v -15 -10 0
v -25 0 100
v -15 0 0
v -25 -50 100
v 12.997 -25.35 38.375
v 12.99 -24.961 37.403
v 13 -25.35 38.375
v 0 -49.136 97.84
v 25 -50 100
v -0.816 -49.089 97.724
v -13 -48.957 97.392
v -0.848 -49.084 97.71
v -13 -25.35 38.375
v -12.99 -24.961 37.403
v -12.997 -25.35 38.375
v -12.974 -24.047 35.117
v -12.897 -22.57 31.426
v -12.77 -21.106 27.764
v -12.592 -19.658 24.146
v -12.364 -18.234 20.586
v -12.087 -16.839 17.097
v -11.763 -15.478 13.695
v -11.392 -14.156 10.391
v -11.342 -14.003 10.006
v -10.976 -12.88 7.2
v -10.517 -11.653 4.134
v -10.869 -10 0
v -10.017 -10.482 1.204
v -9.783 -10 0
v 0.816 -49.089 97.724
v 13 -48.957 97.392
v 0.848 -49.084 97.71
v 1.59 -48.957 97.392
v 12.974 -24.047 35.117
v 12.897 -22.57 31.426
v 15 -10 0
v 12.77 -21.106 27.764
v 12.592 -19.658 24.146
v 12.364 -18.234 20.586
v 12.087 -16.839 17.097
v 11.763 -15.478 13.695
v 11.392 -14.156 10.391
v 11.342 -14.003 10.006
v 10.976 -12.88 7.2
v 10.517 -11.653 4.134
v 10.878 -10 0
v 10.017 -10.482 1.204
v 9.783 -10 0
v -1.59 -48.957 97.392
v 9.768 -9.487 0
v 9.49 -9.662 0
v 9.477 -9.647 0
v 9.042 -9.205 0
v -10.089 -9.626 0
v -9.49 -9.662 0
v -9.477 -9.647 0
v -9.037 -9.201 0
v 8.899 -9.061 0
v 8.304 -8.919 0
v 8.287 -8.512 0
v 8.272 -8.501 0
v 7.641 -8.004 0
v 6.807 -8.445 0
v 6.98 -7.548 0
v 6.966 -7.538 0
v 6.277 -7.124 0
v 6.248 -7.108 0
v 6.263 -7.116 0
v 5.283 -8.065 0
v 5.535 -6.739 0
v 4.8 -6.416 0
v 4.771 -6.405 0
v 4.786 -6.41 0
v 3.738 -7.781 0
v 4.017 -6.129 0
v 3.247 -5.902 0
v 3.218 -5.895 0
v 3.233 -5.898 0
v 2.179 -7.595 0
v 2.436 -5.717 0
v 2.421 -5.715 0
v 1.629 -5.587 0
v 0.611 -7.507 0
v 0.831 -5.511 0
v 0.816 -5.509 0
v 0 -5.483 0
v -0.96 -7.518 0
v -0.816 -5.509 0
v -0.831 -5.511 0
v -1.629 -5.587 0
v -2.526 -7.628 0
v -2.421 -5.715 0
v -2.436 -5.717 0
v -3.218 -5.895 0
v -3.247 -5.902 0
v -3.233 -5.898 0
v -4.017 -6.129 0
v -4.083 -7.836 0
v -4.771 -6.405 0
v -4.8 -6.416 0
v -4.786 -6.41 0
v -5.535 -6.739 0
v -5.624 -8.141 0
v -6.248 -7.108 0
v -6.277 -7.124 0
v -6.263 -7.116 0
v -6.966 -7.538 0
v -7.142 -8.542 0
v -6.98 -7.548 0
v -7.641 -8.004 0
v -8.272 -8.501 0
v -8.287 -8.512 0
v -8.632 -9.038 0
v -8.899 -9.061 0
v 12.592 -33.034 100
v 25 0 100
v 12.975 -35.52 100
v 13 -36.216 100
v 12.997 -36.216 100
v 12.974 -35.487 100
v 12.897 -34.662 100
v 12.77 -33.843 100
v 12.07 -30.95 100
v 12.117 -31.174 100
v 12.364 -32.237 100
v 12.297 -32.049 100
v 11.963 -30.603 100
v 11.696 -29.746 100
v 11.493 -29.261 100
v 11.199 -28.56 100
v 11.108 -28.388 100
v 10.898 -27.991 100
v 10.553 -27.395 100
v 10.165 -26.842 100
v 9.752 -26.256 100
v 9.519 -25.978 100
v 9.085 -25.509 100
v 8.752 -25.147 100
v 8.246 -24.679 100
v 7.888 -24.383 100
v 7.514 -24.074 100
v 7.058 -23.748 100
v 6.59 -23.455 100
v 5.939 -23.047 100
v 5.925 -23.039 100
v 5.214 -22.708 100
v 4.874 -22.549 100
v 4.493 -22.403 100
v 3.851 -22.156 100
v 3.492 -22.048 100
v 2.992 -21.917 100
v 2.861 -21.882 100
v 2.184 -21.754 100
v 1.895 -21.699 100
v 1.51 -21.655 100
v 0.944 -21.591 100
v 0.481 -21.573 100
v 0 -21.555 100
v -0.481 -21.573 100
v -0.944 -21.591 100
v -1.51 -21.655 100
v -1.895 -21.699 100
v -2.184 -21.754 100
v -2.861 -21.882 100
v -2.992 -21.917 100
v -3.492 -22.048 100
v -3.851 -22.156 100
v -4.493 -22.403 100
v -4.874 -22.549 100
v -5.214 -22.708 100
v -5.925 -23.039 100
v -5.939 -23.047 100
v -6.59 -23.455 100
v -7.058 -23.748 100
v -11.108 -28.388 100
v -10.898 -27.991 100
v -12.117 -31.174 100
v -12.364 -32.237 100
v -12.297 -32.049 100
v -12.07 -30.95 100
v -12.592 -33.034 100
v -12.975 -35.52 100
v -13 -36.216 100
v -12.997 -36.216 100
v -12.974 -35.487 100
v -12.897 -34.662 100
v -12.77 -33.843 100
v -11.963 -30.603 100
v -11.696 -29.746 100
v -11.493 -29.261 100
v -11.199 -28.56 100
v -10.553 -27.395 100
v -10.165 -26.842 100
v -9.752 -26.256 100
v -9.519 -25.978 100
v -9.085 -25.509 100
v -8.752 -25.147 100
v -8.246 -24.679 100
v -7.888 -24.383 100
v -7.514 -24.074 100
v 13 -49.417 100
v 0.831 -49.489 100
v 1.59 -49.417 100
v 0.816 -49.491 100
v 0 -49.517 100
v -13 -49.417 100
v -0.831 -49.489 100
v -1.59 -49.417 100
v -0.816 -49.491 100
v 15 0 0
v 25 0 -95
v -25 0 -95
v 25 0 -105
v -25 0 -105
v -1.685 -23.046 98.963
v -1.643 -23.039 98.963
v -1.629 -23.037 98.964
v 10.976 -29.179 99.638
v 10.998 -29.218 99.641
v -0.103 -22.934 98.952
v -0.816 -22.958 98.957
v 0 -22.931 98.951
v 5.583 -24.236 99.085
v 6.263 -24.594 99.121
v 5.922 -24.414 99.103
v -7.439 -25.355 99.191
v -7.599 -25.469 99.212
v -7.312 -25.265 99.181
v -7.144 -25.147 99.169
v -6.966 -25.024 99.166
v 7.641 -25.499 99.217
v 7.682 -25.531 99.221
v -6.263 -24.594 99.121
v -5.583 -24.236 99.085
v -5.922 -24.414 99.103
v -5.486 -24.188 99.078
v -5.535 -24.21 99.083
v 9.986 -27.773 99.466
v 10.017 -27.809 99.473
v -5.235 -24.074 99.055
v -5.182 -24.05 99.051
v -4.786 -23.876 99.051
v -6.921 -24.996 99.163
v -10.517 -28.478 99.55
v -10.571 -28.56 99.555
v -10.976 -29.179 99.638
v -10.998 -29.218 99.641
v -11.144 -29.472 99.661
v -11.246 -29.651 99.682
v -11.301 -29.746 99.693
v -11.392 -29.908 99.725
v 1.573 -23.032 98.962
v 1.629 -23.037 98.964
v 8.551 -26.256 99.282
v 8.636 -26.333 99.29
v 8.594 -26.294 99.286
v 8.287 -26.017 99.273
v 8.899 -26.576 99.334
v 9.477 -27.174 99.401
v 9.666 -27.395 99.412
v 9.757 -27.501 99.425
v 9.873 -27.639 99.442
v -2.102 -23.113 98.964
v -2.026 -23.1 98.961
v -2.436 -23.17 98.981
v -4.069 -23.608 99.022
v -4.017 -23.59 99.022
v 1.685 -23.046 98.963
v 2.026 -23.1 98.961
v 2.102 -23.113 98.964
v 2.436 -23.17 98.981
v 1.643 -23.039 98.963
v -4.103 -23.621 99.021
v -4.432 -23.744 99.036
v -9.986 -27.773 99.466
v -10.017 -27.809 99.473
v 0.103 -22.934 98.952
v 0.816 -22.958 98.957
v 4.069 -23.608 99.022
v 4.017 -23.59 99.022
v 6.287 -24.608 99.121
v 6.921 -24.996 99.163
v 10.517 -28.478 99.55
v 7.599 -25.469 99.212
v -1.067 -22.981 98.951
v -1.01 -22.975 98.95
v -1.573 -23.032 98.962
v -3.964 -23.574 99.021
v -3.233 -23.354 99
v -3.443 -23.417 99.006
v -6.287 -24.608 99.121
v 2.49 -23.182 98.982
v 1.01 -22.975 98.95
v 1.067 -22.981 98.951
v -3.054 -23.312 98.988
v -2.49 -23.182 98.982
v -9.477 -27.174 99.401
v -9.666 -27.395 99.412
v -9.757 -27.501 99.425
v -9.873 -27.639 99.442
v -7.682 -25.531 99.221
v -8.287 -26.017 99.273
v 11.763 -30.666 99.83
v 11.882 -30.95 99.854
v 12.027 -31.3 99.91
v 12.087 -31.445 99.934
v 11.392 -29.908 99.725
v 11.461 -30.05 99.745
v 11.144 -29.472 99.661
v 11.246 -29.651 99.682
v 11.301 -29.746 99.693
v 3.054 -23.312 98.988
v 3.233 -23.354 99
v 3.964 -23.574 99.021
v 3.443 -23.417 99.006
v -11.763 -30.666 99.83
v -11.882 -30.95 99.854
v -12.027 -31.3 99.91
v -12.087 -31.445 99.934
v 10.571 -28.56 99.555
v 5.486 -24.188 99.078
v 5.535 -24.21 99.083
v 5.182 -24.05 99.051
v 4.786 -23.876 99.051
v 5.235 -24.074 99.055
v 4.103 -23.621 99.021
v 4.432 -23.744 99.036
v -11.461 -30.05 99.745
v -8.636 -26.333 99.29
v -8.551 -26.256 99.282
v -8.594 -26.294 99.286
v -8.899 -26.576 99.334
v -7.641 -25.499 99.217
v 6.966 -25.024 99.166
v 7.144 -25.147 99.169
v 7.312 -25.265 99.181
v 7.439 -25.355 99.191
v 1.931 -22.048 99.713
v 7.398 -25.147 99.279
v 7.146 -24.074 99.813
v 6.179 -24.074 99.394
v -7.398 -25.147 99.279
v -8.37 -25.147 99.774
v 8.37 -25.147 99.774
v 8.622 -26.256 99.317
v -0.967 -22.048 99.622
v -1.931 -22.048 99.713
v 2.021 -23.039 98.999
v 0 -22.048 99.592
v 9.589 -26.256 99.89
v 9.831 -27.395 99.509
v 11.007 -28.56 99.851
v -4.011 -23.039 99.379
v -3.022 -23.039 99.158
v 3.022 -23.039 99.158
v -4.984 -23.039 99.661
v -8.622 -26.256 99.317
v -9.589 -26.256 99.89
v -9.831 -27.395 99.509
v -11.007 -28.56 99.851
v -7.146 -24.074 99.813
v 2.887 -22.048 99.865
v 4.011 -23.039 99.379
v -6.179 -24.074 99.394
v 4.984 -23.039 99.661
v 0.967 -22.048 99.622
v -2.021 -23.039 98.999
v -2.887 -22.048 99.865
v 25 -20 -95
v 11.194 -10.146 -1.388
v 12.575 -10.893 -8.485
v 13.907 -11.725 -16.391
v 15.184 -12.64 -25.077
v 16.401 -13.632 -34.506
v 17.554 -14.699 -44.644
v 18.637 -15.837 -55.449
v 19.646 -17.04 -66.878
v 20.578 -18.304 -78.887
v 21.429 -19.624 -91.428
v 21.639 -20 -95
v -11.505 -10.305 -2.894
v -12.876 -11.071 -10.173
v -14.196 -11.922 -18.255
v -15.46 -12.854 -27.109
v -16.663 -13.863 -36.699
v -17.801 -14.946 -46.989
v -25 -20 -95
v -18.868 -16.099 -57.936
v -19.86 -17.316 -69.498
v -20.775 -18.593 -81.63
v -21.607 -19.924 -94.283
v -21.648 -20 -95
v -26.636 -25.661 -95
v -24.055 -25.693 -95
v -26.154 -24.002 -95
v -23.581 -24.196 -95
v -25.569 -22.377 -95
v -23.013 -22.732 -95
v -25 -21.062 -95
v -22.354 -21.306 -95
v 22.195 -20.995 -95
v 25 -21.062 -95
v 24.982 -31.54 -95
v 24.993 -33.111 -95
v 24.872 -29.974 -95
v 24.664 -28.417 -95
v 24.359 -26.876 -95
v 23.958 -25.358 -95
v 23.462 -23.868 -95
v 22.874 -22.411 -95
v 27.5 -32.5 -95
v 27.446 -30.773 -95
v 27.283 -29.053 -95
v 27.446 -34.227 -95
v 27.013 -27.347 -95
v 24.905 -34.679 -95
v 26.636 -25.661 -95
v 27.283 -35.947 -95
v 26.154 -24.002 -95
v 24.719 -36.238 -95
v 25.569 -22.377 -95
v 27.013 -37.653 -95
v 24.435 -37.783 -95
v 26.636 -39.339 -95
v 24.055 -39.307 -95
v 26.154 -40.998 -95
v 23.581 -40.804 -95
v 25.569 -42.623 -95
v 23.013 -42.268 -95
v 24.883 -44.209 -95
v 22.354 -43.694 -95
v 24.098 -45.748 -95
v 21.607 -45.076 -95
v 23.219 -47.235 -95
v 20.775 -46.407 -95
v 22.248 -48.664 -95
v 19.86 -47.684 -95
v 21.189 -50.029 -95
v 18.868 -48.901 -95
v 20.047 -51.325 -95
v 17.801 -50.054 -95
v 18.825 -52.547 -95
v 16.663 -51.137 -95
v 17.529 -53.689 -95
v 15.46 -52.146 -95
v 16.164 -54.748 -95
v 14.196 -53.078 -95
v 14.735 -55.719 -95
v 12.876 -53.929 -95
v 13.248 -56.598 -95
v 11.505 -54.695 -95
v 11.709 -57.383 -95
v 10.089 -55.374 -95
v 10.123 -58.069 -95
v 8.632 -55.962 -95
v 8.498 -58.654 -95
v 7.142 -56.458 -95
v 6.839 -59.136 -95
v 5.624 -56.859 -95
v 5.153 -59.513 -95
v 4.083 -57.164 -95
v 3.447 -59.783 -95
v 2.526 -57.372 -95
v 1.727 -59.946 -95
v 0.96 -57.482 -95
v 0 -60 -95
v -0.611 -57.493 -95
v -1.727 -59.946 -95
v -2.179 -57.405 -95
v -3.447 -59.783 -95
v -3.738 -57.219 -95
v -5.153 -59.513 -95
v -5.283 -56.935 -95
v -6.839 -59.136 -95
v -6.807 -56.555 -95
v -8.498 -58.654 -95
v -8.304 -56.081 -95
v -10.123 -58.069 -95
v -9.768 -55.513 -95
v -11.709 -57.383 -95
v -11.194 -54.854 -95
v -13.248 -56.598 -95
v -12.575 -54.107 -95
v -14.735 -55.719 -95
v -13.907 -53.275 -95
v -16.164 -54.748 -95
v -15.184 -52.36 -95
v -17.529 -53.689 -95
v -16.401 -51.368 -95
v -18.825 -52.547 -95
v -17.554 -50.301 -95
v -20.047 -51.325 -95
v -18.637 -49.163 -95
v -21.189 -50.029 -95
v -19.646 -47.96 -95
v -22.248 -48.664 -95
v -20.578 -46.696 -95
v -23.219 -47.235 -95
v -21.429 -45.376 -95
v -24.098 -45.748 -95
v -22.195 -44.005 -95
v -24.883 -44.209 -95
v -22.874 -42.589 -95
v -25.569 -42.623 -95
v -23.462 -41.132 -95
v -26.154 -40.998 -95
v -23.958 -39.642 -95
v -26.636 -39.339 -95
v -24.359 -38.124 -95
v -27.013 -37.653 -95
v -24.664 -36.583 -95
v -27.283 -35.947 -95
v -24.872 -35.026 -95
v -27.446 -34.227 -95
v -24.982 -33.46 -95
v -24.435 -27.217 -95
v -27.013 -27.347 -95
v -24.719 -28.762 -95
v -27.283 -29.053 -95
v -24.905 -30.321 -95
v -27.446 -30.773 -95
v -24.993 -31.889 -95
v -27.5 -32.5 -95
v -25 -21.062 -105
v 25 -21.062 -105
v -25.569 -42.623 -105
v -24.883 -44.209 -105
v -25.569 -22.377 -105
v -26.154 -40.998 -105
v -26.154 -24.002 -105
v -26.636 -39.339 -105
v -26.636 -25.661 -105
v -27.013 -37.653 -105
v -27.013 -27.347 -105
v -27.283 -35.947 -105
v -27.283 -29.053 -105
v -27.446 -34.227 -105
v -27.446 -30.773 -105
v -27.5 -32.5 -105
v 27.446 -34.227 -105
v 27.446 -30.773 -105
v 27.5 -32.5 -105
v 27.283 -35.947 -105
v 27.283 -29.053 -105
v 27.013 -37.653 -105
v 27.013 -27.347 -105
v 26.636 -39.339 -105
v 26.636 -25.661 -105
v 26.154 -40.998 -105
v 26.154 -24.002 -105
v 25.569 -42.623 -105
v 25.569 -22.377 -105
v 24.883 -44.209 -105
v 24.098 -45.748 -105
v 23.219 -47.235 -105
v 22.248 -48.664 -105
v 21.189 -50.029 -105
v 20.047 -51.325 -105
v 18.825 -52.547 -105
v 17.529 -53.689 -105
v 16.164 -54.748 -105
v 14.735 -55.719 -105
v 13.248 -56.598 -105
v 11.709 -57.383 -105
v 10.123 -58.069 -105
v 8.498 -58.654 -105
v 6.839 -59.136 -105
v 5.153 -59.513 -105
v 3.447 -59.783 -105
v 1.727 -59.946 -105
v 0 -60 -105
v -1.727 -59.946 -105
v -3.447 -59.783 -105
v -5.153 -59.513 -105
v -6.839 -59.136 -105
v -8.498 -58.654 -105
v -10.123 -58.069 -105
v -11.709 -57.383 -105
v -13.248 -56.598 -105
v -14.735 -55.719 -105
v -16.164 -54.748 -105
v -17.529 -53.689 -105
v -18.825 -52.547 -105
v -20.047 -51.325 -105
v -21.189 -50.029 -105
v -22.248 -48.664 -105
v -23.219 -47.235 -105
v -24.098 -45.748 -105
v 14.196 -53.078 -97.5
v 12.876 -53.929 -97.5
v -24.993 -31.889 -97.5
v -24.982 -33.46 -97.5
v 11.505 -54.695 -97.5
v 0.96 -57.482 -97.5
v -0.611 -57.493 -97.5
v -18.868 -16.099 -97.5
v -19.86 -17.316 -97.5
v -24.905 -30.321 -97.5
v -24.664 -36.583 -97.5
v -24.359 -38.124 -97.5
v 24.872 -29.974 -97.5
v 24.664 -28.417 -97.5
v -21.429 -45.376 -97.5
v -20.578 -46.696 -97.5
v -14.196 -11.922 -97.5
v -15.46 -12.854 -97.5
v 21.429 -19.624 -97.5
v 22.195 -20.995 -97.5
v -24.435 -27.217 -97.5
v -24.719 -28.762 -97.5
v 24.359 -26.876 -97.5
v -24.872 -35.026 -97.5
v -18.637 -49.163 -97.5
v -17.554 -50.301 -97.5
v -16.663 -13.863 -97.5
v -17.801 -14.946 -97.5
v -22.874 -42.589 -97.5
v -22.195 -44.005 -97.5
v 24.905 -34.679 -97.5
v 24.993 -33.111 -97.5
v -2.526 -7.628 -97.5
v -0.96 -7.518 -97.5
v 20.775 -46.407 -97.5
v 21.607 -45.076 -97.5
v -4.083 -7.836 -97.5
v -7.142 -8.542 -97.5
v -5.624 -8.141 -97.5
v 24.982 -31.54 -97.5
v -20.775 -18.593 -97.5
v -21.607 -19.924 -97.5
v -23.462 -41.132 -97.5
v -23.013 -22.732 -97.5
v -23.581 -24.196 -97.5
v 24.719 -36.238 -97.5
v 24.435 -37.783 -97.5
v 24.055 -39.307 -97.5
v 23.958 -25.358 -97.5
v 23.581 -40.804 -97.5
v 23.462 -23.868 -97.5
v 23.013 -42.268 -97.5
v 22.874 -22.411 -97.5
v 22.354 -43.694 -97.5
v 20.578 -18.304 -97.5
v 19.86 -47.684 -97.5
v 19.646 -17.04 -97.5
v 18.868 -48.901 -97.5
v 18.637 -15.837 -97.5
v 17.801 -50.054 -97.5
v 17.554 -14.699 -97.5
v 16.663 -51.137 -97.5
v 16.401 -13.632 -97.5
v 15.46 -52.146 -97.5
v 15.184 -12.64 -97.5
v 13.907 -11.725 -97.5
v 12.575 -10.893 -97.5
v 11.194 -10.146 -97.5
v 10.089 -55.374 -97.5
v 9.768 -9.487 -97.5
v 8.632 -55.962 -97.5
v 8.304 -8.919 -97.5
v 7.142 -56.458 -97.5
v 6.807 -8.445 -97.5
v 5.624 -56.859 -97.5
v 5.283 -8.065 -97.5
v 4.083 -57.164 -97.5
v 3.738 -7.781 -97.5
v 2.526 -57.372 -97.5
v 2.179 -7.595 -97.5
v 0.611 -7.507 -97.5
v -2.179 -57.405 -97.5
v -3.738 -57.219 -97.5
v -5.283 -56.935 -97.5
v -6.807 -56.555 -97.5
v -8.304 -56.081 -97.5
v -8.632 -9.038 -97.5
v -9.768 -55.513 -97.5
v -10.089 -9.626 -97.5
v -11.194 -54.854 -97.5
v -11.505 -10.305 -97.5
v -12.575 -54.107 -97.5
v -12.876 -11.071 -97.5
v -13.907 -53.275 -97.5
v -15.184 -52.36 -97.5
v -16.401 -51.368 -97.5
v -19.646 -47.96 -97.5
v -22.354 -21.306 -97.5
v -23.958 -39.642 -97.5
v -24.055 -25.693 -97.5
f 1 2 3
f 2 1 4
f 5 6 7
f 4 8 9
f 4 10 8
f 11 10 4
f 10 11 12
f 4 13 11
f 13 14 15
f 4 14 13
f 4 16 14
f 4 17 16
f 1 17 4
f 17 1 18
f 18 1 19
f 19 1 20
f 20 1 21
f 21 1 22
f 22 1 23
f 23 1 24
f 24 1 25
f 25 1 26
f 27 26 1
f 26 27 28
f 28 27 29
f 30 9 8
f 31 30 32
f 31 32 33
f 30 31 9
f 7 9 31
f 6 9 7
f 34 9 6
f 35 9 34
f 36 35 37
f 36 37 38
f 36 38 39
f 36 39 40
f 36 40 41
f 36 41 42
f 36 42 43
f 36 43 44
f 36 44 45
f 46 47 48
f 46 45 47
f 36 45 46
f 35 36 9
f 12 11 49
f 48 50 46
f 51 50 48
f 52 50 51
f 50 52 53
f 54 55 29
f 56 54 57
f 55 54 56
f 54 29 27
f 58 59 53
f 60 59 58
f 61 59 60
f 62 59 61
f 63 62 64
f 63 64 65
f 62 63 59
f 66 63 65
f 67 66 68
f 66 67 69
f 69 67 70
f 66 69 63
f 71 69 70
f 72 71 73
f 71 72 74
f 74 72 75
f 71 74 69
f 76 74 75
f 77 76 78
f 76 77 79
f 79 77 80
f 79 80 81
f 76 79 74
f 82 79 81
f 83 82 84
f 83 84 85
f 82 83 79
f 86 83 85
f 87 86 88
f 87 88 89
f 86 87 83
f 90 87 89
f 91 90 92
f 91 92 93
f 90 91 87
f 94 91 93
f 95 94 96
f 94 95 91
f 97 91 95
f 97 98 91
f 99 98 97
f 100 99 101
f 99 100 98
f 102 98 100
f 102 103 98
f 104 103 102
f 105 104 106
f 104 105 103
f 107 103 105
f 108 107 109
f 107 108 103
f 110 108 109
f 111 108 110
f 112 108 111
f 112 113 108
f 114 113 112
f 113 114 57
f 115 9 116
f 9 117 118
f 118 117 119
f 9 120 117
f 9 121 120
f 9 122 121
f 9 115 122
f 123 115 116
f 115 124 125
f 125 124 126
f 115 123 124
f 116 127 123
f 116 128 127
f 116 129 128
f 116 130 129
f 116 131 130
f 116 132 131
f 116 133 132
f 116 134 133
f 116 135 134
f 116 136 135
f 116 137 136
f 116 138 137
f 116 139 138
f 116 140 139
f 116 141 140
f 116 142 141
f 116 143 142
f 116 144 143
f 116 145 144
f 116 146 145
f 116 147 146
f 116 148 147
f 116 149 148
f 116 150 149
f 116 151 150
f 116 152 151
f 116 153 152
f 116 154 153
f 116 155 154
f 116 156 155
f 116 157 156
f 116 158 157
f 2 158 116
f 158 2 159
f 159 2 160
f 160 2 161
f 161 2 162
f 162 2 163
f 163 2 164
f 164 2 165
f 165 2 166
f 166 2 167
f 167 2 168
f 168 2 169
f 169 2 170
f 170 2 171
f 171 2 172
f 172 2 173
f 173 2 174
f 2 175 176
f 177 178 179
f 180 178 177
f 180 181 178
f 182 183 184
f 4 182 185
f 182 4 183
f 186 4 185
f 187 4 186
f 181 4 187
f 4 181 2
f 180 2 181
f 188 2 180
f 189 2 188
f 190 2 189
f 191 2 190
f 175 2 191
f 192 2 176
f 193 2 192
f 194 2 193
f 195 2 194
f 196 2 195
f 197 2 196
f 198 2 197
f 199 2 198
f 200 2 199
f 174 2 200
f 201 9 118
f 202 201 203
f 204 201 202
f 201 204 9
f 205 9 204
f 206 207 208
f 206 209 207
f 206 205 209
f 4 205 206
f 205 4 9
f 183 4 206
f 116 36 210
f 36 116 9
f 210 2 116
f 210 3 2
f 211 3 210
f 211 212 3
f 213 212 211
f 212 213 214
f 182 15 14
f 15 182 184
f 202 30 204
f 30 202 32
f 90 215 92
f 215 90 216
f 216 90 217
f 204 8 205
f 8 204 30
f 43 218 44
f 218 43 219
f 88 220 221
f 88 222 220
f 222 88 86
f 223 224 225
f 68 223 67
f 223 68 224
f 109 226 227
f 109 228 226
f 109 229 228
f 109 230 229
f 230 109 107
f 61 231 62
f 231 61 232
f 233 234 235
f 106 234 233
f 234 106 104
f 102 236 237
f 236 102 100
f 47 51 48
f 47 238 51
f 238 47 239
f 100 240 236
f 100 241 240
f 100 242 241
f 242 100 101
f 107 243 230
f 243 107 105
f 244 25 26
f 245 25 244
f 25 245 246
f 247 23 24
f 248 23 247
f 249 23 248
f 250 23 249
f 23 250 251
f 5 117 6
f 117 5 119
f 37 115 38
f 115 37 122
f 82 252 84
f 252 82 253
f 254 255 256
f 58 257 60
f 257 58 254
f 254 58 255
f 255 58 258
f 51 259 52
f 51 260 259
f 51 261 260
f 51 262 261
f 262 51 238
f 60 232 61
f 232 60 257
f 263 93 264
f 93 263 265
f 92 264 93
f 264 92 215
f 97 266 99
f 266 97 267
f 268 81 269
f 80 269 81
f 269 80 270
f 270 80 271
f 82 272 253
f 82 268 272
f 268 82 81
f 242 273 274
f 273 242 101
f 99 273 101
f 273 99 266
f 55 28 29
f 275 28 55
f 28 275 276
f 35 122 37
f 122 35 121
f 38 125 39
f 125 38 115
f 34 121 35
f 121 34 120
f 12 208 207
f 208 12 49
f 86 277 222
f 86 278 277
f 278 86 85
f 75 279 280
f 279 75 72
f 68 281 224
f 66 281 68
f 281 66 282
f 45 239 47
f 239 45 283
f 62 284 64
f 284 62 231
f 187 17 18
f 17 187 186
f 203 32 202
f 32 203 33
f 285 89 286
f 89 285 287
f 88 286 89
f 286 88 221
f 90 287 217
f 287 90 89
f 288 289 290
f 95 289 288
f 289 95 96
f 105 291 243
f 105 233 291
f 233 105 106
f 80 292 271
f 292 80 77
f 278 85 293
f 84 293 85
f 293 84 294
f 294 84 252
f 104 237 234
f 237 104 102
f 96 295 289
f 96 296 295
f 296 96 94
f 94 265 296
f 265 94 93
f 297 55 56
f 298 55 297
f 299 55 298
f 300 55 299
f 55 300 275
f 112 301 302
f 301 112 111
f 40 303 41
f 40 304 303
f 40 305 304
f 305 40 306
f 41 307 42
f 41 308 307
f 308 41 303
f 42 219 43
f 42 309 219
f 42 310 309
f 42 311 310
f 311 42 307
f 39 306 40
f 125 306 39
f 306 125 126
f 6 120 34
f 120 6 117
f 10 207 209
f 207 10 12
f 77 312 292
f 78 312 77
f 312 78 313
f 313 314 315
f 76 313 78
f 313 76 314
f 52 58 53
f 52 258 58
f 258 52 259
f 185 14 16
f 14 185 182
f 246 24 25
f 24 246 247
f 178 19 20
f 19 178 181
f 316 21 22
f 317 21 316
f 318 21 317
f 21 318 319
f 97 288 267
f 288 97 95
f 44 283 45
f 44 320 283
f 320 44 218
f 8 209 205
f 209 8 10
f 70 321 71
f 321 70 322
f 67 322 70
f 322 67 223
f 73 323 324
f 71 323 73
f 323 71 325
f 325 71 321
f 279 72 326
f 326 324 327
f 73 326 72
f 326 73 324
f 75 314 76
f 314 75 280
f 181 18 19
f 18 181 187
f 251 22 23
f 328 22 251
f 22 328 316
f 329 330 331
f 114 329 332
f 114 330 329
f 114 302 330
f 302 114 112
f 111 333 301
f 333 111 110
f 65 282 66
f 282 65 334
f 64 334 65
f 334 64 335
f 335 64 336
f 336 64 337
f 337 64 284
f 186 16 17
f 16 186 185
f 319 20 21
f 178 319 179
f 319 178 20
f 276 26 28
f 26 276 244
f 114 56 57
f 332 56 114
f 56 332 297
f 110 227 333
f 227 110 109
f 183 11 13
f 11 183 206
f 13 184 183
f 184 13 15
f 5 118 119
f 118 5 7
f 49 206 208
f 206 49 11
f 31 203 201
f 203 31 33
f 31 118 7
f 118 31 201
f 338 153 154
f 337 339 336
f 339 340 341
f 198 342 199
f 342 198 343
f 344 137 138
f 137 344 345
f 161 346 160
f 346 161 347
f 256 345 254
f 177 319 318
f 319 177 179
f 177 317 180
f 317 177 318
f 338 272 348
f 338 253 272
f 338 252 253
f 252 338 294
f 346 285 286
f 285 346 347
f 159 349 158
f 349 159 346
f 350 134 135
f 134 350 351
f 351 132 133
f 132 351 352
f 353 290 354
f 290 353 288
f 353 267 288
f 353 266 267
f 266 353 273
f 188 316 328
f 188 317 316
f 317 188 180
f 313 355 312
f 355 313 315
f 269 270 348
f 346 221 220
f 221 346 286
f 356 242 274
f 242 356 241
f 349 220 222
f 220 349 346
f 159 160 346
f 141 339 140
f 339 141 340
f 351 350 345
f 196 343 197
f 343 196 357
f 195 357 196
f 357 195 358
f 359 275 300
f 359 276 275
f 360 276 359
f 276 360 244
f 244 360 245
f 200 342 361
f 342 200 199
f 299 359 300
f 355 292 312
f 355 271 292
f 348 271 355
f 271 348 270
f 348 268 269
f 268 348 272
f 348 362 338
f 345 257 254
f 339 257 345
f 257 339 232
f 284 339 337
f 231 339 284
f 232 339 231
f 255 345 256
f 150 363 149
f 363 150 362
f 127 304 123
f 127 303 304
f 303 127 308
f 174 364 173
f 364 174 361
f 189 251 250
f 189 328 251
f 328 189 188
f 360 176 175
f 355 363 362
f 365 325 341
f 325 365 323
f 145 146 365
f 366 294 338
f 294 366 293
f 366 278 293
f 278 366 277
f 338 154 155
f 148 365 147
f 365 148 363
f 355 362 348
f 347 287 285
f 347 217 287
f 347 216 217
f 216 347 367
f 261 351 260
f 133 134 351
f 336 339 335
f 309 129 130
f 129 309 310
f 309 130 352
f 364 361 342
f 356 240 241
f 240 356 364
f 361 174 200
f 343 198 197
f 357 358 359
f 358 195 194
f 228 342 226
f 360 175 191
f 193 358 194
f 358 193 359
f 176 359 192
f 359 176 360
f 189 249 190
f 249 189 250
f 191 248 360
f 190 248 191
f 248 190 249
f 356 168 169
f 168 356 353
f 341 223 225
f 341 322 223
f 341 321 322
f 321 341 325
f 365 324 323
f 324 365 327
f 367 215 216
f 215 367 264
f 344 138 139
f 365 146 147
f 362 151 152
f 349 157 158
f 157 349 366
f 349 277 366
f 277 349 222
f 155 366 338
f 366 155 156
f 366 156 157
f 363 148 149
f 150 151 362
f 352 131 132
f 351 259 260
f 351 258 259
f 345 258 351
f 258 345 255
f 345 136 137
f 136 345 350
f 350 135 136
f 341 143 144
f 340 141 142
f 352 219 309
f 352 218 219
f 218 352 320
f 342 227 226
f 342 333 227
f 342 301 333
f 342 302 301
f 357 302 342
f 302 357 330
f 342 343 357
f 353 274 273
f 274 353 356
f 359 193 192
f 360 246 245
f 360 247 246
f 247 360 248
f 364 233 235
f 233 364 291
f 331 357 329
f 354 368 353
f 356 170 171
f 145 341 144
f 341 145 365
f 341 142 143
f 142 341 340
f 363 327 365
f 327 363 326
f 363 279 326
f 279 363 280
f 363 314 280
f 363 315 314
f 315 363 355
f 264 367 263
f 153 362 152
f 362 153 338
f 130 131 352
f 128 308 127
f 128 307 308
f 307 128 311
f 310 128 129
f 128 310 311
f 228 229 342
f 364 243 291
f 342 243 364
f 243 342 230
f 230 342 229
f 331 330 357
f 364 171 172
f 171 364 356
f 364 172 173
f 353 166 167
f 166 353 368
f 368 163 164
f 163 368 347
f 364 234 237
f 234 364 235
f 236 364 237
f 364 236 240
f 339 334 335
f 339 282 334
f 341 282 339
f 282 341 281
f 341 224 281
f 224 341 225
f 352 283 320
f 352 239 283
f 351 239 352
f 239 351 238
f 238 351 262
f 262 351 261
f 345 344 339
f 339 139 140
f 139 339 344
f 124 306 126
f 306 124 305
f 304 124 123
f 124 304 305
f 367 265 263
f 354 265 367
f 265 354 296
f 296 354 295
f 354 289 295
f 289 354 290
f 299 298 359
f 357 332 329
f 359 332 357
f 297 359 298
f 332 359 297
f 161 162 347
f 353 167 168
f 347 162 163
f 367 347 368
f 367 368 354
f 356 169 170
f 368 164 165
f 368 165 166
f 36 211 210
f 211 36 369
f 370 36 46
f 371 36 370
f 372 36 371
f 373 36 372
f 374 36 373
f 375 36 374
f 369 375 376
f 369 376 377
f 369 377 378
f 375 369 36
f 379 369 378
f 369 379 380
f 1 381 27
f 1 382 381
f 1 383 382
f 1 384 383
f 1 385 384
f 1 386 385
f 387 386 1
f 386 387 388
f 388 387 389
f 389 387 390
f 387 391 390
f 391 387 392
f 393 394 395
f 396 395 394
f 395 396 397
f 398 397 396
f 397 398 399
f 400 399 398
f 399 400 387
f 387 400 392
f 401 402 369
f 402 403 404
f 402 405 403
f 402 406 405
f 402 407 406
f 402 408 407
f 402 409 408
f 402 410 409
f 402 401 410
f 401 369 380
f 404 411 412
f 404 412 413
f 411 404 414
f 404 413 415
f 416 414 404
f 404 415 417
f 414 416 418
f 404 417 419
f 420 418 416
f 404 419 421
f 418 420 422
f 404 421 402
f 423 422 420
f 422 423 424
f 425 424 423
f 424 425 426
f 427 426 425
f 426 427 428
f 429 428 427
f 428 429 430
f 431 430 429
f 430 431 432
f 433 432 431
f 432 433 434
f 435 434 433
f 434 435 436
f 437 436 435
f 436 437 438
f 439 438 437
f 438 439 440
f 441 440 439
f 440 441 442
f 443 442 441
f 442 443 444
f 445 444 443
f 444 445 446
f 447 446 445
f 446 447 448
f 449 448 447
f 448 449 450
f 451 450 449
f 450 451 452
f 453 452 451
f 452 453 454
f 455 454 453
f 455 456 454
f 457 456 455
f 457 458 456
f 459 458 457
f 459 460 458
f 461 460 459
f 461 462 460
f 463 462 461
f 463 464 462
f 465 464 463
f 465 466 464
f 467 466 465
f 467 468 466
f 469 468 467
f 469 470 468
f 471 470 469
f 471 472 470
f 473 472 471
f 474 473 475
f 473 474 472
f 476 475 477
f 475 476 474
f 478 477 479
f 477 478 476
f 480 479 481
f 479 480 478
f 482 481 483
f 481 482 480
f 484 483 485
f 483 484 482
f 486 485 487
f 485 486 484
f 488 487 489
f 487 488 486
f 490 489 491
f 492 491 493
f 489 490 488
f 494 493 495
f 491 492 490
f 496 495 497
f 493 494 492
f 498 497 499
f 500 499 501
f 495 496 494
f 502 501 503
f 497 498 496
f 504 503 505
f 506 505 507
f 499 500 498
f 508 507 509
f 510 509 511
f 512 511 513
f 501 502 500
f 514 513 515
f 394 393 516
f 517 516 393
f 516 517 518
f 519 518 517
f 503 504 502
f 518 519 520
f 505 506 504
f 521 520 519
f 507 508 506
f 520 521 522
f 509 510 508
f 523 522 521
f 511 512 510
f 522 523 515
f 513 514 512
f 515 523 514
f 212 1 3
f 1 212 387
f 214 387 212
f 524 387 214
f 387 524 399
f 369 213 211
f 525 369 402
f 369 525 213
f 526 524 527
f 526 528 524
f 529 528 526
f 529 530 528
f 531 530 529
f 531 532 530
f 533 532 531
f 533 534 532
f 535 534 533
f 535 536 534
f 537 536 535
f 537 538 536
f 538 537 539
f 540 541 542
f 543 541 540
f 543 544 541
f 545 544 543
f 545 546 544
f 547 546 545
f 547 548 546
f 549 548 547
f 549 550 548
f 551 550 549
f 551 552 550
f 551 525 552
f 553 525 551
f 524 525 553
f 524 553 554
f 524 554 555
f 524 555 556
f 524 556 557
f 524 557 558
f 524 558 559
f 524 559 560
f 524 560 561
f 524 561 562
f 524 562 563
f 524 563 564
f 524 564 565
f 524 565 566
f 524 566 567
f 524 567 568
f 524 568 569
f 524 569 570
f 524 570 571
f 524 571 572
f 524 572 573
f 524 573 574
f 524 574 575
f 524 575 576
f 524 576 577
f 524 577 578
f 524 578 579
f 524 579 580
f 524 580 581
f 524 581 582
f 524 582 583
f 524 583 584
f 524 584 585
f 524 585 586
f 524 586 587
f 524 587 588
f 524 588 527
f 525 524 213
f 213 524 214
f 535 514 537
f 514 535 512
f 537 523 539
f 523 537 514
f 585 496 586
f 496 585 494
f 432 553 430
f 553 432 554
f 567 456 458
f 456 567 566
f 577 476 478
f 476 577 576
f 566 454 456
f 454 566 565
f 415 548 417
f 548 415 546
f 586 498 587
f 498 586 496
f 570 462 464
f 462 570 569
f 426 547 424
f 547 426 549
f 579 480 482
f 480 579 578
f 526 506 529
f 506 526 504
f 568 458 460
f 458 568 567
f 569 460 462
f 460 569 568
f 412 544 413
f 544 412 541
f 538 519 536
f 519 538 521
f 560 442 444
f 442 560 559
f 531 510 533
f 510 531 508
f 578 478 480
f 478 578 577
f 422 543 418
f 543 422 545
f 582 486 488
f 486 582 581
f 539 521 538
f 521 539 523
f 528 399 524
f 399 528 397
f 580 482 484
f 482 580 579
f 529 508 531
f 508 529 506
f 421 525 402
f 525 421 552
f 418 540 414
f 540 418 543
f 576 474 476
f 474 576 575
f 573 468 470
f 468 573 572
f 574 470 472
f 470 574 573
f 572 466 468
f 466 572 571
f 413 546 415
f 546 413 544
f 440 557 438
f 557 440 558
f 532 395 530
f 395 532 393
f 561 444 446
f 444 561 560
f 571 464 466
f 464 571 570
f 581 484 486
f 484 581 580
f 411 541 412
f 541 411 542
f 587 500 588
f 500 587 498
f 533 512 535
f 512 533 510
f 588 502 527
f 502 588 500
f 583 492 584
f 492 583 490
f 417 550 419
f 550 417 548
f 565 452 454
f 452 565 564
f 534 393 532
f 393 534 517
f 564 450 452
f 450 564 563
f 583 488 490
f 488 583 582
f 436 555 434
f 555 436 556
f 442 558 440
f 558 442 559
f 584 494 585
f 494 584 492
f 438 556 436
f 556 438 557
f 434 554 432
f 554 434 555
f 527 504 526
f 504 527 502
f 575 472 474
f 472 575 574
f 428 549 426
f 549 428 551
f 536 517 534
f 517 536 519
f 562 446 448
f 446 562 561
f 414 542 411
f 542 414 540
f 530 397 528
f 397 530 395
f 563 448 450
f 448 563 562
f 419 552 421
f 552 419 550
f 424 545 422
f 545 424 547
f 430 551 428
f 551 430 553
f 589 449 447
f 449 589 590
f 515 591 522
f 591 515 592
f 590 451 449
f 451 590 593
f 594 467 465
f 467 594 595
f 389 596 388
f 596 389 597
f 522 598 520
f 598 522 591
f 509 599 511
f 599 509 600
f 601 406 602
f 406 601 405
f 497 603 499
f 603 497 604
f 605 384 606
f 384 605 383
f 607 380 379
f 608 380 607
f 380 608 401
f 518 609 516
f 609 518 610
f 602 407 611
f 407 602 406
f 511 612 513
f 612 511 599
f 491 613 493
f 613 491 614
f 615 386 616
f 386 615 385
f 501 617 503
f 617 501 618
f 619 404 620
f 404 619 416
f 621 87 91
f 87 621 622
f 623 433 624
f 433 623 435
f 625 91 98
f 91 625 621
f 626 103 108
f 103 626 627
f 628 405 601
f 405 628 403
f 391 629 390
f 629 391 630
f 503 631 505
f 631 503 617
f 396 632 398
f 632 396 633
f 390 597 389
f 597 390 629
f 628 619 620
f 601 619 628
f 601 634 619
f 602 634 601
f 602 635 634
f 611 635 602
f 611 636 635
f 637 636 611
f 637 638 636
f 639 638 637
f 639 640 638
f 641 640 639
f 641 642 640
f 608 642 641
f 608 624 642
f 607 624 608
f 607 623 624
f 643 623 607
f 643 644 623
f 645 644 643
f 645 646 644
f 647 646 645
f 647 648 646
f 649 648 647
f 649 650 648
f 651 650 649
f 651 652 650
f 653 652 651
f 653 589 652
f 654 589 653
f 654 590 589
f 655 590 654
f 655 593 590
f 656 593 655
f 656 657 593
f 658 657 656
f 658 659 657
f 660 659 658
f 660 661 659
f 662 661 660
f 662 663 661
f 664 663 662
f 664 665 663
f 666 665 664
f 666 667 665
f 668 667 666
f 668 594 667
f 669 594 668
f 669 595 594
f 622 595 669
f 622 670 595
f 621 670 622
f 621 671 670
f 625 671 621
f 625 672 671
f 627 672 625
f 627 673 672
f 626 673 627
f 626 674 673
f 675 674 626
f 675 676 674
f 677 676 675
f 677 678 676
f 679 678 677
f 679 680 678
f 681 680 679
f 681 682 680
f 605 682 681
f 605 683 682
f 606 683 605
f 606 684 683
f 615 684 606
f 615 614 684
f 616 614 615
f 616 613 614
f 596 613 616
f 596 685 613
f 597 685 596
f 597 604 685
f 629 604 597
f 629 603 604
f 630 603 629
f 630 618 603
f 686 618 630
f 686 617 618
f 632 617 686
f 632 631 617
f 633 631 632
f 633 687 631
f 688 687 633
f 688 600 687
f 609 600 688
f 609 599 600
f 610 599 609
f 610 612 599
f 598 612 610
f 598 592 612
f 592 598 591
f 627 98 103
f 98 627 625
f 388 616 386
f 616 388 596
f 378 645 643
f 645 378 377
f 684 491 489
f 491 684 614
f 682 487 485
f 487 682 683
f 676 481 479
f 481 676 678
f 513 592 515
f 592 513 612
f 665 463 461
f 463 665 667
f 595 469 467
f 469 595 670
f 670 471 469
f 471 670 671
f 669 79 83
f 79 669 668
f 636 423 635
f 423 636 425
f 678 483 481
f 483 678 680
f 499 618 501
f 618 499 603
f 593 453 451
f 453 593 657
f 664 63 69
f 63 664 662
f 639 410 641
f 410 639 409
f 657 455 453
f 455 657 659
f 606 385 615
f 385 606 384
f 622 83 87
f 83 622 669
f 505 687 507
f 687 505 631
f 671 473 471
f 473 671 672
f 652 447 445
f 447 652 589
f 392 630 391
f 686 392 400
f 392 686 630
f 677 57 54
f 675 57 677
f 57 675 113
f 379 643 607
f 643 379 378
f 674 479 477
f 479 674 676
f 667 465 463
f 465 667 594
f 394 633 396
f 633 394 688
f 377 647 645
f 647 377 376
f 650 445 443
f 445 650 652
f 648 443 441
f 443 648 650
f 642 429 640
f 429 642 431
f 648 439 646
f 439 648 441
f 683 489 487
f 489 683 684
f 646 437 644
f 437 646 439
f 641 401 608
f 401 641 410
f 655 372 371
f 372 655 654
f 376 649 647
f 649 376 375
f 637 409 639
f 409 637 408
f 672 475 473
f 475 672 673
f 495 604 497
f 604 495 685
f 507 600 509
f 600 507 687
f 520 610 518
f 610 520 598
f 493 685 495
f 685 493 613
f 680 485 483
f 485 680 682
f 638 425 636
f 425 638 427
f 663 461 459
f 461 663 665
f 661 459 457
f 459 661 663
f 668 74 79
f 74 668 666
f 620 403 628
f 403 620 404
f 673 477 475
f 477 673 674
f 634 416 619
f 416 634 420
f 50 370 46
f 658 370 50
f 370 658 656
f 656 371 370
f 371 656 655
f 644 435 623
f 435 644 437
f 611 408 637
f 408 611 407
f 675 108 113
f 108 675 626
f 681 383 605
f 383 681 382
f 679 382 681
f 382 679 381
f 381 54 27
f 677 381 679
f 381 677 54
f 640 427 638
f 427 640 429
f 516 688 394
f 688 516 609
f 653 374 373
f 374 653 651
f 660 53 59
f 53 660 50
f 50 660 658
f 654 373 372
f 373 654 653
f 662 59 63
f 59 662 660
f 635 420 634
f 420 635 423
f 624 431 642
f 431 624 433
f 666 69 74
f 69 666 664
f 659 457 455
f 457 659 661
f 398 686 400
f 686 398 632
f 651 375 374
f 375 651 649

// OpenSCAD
$fn = 100;

// Top envelope dimensions
Lt = 100; // Top section length
Ht = 50; // Top section height
W = 50; // Top and bottom width

Hc = 10; // Center section height

d = 10; // Top displacement
Lb = 95; // Bottom section length
Hb = 20; // Bottom section heigth
Wc = 30; // Center width

// Top hole
a = 100; // Cylinder inclination
Rt = Wc/2-2; // Cylinder radius
Rs = Rt*1.5; // Sphere radius

// Foot
Hf = 10; // Foot height


module top_envelope() {
    points = [
        // Bottom face
        [-Wc/2,-Lt/2,0], 
        [-Wc/2,-Lt/2,Hc],
        [Wc/2,-Lt/2,Hc],
        [Wc/2,-Lt/2,0],
        // Top face
        [-W/2,Lt/2,0],
        [W/2,Lt/2,0],
        [W/2,Lt/2,Ht],
        [-W/2,Lt/2,Ht]
    ];
    faces = [
        [0,1,2,3],
        [0,4,7,1],
        [0,3,5,4],
        [3,2,6,5],
        [4,5,6,7],
        [1,7,6,2]
    ];
    polyhedron(points=points, faces=faces);
}

module top_section() {
    difference() {
        top_envelope();
        
        translate([0,0,.55*Ht])
        rotate([a,0,0])
            cylinder(r = Rt, h = Lt*1.1, center = true);
        
        translate([0,0,.55*Ht+Rt/2])
        rotate([a,0,0])
            cube([2*Rt, Rt, Lt*1.1], center = true);
        
        translate([0, Lt/2+15, .55*Ht + Rt/2])
            sphere(r = Rs);
    }
}

module bottom_envelope() {
    points = [
        [-Wc/2,-Lb/2,0], 
        [-Wc/2,-Lb/2,Hc],
        [Wc/2,-Lb/2,Hc],
        [Wc/2,-Lb/2,0],
        [-W/2,Lb/2,0],
        [W/2,Lb/2,0],
        [W/2,Lb/2,Hb],
        [-W/2,Lb/2,Hb]
    ];
    faces = [
        [0,1,2,3],
        [0,4,7,1],
        [0,3,5,4],
        [3,2,6,5],
        [4,5,6,7],
        [1,7,6,2]
    ];
    polyhedron(points=points, faces=faces);
}

module bottom_section() {    
    difference() {
        union() {
            bottom_envelope();
            
            hh = W*0.3;
            translate([0,Lb/2+Hf/2,hh])
                cube([W, Hf, 2*hh], center = true);
            
            translate([0,Lb/2+Hf/2,W*0.65])
            rotate([90, 0, 0])
                cylinder(r = W/2*1.1, h = Hf, center = true);
        }
        translate([0,0, W*0.65])
            rotate([90,Hf/2,0])
            cylinder(r = W/2, h = Lb + Hf/2, center=true);
    }
}


module holder() {
    union() {
        translate([0,0,Lt/2])
        rotate([90,0,0])
            top_section();
        translate([0,0,-Lb/2])
        rotate([90,180,0])
            bottom_section();
    }
}

holder();
